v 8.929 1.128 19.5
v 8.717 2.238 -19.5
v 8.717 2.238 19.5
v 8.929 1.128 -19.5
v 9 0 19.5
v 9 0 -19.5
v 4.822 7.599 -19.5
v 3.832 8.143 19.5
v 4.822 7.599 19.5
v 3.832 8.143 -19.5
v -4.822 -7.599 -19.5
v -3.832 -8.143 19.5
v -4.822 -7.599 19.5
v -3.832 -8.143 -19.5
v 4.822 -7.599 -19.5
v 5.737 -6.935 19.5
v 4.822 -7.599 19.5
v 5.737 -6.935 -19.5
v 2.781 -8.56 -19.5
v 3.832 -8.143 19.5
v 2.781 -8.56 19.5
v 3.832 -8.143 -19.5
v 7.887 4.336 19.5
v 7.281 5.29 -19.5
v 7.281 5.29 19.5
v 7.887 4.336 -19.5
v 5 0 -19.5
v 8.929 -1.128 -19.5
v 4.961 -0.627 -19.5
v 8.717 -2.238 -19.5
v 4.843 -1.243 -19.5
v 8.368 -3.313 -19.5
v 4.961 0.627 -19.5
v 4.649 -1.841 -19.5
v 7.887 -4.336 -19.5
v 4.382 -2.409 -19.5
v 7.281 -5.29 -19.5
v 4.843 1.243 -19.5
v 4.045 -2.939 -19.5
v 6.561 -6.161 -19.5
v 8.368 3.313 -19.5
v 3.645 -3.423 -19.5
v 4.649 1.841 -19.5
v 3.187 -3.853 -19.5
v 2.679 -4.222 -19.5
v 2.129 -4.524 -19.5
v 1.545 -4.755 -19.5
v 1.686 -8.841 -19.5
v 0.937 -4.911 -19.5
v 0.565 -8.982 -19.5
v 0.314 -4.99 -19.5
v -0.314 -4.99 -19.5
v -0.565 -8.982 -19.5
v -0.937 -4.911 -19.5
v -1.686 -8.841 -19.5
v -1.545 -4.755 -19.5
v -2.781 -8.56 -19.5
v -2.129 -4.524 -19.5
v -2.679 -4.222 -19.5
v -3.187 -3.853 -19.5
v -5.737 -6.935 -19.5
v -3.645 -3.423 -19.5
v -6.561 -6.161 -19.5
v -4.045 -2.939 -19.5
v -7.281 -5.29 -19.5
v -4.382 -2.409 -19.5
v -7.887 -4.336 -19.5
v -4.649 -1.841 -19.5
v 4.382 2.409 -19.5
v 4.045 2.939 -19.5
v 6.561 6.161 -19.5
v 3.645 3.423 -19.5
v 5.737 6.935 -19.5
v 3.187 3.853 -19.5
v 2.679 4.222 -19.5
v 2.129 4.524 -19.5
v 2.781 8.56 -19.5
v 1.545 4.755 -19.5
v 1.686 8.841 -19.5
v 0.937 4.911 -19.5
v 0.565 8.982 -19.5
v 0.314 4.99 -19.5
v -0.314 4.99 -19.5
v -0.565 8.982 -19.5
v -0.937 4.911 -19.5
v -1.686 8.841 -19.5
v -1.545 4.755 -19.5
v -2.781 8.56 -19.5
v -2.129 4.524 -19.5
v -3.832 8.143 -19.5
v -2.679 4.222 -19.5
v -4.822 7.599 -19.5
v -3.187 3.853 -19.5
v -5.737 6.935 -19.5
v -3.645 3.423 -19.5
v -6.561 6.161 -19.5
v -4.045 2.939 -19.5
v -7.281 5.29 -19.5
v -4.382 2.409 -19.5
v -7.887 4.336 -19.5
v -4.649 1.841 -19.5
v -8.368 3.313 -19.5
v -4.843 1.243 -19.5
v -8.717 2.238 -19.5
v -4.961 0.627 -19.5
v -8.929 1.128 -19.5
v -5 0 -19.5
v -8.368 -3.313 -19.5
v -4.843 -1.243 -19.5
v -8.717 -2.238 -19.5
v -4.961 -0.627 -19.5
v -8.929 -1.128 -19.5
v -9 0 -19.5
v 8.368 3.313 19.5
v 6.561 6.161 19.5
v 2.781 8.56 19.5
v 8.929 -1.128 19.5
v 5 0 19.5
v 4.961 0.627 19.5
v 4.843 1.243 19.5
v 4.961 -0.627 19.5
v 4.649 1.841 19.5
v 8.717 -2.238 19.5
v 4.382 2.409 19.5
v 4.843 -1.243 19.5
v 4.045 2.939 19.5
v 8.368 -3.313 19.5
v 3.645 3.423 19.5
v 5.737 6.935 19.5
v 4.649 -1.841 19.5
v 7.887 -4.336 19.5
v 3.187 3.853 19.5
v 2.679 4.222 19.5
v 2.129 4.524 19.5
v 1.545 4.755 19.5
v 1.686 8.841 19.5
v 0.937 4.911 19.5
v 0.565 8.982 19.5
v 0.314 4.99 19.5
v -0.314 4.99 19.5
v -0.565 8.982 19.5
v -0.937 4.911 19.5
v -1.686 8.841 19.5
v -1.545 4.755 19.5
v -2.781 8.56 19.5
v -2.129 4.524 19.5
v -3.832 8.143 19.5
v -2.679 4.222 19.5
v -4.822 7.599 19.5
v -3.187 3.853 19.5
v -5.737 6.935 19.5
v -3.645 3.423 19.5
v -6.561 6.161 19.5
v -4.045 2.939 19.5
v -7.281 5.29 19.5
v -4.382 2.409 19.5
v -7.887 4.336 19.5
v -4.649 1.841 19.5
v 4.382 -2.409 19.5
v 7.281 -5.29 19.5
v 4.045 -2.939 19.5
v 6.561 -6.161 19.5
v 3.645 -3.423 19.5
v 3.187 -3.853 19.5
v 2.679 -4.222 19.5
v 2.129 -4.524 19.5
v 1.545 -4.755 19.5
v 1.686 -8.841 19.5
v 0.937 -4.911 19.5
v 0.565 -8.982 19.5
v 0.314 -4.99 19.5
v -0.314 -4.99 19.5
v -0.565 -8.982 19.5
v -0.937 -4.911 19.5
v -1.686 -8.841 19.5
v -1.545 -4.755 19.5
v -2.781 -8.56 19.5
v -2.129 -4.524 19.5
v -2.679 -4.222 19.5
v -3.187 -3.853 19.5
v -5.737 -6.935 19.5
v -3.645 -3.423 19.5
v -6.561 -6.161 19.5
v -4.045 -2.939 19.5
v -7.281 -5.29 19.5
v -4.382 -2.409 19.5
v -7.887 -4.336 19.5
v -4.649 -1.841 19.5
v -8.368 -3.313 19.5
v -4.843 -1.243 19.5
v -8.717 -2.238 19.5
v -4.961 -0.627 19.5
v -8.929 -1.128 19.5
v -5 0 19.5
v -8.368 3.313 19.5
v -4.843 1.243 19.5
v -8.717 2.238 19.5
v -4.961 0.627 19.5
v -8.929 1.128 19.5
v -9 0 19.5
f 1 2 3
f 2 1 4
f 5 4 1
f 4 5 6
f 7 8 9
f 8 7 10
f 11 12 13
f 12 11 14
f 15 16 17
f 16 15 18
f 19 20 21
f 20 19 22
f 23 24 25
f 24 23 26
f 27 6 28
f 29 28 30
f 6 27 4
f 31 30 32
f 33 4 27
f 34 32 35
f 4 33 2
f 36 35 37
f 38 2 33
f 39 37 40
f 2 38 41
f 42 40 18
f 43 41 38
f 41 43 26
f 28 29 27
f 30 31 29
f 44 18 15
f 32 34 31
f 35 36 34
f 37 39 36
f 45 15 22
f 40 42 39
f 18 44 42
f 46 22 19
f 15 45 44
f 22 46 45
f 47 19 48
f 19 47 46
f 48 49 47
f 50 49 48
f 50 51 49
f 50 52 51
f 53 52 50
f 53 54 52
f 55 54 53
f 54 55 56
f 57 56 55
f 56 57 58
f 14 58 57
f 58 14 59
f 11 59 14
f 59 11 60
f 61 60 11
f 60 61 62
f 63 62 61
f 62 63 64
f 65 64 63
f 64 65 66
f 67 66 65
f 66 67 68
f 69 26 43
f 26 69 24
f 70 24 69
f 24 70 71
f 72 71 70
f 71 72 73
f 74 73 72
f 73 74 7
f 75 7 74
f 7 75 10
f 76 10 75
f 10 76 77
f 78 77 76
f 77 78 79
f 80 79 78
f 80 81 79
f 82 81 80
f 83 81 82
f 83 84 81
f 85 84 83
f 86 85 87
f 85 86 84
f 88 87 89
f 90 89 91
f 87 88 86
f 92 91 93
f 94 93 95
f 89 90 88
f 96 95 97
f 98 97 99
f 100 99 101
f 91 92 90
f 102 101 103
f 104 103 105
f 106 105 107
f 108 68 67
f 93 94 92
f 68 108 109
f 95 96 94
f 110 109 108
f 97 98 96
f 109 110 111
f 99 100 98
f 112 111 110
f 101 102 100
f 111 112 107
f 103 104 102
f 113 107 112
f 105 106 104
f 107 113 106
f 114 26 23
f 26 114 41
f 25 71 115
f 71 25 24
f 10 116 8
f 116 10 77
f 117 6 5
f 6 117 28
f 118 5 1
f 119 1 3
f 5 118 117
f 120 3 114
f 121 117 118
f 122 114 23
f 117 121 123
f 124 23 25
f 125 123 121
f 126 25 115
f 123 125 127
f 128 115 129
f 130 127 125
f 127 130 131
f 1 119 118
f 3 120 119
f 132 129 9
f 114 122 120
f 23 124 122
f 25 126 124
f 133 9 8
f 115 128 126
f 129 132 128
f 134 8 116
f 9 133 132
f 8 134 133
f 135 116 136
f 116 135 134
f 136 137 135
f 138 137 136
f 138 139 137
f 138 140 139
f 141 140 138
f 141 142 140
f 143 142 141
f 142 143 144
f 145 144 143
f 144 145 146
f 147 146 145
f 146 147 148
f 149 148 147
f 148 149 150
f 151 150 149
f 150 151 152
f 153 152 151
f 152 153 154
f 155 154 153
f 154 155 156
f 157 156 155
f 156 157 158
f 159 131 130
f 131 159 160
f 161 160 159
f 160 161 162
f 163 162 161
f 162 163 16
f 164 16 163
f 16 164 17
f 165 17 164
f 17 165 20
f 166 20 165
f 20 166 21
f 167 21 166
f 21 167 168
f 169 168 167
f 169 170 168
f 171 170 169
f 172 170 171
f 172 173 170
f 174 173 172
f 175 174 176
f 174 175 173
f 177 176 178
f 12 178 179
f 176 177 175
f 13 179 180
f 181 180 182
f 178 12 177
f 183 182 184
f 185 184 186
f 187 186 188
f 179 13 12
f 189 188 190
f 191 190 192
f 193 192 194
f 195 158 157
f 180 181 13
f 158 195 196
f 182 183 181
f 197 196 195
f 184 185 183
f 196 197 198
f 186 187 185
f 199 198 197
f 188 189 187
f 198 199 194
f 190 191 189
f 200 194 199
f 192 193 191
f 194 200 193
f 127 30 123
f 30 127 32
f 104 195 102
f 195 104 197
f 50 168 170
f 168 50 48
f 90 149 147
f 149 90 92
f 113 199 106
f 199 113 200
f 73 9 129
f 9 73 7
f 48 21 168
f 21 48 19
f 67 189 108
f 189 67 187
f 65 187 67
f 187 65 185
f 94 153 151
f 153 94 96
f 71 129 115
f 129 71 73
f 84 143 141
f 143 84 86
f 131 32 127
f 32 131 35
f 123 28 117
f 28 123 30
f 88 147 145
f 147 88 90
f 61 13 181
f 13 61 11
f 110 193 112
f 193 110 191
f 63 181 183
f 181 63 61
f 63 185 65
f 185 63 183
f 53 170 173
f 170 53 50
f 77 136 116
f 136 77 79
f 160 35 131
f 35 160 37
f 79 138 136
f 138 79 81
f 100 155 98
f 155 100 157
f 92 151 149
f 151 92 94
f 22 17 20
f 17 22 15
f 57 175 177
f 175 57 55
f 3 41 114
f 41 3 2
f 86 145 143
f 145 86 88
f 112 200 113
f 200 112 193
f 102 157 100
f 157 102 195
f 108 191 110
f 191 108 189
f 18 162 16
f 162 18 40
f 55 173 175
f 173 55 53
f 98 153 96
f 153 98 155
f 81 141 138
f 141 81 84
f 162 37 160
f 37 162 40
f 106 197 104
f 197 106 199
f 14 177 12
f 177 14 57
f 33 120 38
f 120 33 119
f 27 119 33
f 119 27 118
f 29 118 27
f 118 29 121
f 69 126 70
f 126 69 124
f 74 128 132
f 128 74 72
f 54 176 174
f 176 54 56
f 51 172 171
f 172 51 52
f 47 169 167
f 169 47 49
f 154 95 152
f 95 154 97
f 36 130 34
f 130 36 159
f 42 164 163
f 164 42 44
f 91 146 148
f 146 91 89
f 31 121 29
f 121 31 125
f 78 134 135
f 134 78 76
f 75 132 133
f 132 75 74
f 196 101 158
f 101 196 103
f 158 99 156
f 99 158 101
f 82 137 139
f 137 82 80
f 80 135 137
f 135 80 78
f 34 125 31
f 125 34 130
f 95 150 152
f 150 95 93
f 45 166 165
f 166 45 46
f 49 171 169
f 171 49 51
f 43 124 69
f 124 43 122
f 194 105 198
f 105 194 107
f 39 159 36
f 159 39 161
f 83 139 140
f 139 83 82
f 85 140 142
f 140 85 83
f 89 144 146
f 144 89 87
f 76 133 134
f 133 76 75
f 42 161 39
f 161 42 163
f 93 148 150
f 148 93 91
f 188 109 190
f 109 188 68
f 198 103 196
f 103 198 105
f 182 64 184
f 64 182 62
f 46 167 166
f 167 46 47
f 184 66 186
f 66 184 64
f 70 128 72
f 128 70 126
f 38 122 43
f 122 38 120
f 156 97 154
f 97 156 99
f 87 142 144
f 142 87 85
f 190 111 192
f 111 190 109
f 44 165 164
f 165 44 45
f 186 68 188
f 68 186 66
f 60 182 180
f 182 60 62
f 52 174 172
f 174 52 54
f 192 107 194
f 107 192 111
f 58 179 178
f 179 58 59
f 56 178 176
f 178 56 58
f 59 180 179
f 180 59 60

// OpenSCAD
$fn = 50;


difference() {
	union() {
		translate(v = [0, 0, -19.5000000000]) {
			cylinder(h = 39, r = 9.0000000000);
		}
	}
	union() {
		translate(v = [0, 0, -100.0000000000]) {
			cylinder(h = 200, r = 5.0000000000);
		}
	}
}
